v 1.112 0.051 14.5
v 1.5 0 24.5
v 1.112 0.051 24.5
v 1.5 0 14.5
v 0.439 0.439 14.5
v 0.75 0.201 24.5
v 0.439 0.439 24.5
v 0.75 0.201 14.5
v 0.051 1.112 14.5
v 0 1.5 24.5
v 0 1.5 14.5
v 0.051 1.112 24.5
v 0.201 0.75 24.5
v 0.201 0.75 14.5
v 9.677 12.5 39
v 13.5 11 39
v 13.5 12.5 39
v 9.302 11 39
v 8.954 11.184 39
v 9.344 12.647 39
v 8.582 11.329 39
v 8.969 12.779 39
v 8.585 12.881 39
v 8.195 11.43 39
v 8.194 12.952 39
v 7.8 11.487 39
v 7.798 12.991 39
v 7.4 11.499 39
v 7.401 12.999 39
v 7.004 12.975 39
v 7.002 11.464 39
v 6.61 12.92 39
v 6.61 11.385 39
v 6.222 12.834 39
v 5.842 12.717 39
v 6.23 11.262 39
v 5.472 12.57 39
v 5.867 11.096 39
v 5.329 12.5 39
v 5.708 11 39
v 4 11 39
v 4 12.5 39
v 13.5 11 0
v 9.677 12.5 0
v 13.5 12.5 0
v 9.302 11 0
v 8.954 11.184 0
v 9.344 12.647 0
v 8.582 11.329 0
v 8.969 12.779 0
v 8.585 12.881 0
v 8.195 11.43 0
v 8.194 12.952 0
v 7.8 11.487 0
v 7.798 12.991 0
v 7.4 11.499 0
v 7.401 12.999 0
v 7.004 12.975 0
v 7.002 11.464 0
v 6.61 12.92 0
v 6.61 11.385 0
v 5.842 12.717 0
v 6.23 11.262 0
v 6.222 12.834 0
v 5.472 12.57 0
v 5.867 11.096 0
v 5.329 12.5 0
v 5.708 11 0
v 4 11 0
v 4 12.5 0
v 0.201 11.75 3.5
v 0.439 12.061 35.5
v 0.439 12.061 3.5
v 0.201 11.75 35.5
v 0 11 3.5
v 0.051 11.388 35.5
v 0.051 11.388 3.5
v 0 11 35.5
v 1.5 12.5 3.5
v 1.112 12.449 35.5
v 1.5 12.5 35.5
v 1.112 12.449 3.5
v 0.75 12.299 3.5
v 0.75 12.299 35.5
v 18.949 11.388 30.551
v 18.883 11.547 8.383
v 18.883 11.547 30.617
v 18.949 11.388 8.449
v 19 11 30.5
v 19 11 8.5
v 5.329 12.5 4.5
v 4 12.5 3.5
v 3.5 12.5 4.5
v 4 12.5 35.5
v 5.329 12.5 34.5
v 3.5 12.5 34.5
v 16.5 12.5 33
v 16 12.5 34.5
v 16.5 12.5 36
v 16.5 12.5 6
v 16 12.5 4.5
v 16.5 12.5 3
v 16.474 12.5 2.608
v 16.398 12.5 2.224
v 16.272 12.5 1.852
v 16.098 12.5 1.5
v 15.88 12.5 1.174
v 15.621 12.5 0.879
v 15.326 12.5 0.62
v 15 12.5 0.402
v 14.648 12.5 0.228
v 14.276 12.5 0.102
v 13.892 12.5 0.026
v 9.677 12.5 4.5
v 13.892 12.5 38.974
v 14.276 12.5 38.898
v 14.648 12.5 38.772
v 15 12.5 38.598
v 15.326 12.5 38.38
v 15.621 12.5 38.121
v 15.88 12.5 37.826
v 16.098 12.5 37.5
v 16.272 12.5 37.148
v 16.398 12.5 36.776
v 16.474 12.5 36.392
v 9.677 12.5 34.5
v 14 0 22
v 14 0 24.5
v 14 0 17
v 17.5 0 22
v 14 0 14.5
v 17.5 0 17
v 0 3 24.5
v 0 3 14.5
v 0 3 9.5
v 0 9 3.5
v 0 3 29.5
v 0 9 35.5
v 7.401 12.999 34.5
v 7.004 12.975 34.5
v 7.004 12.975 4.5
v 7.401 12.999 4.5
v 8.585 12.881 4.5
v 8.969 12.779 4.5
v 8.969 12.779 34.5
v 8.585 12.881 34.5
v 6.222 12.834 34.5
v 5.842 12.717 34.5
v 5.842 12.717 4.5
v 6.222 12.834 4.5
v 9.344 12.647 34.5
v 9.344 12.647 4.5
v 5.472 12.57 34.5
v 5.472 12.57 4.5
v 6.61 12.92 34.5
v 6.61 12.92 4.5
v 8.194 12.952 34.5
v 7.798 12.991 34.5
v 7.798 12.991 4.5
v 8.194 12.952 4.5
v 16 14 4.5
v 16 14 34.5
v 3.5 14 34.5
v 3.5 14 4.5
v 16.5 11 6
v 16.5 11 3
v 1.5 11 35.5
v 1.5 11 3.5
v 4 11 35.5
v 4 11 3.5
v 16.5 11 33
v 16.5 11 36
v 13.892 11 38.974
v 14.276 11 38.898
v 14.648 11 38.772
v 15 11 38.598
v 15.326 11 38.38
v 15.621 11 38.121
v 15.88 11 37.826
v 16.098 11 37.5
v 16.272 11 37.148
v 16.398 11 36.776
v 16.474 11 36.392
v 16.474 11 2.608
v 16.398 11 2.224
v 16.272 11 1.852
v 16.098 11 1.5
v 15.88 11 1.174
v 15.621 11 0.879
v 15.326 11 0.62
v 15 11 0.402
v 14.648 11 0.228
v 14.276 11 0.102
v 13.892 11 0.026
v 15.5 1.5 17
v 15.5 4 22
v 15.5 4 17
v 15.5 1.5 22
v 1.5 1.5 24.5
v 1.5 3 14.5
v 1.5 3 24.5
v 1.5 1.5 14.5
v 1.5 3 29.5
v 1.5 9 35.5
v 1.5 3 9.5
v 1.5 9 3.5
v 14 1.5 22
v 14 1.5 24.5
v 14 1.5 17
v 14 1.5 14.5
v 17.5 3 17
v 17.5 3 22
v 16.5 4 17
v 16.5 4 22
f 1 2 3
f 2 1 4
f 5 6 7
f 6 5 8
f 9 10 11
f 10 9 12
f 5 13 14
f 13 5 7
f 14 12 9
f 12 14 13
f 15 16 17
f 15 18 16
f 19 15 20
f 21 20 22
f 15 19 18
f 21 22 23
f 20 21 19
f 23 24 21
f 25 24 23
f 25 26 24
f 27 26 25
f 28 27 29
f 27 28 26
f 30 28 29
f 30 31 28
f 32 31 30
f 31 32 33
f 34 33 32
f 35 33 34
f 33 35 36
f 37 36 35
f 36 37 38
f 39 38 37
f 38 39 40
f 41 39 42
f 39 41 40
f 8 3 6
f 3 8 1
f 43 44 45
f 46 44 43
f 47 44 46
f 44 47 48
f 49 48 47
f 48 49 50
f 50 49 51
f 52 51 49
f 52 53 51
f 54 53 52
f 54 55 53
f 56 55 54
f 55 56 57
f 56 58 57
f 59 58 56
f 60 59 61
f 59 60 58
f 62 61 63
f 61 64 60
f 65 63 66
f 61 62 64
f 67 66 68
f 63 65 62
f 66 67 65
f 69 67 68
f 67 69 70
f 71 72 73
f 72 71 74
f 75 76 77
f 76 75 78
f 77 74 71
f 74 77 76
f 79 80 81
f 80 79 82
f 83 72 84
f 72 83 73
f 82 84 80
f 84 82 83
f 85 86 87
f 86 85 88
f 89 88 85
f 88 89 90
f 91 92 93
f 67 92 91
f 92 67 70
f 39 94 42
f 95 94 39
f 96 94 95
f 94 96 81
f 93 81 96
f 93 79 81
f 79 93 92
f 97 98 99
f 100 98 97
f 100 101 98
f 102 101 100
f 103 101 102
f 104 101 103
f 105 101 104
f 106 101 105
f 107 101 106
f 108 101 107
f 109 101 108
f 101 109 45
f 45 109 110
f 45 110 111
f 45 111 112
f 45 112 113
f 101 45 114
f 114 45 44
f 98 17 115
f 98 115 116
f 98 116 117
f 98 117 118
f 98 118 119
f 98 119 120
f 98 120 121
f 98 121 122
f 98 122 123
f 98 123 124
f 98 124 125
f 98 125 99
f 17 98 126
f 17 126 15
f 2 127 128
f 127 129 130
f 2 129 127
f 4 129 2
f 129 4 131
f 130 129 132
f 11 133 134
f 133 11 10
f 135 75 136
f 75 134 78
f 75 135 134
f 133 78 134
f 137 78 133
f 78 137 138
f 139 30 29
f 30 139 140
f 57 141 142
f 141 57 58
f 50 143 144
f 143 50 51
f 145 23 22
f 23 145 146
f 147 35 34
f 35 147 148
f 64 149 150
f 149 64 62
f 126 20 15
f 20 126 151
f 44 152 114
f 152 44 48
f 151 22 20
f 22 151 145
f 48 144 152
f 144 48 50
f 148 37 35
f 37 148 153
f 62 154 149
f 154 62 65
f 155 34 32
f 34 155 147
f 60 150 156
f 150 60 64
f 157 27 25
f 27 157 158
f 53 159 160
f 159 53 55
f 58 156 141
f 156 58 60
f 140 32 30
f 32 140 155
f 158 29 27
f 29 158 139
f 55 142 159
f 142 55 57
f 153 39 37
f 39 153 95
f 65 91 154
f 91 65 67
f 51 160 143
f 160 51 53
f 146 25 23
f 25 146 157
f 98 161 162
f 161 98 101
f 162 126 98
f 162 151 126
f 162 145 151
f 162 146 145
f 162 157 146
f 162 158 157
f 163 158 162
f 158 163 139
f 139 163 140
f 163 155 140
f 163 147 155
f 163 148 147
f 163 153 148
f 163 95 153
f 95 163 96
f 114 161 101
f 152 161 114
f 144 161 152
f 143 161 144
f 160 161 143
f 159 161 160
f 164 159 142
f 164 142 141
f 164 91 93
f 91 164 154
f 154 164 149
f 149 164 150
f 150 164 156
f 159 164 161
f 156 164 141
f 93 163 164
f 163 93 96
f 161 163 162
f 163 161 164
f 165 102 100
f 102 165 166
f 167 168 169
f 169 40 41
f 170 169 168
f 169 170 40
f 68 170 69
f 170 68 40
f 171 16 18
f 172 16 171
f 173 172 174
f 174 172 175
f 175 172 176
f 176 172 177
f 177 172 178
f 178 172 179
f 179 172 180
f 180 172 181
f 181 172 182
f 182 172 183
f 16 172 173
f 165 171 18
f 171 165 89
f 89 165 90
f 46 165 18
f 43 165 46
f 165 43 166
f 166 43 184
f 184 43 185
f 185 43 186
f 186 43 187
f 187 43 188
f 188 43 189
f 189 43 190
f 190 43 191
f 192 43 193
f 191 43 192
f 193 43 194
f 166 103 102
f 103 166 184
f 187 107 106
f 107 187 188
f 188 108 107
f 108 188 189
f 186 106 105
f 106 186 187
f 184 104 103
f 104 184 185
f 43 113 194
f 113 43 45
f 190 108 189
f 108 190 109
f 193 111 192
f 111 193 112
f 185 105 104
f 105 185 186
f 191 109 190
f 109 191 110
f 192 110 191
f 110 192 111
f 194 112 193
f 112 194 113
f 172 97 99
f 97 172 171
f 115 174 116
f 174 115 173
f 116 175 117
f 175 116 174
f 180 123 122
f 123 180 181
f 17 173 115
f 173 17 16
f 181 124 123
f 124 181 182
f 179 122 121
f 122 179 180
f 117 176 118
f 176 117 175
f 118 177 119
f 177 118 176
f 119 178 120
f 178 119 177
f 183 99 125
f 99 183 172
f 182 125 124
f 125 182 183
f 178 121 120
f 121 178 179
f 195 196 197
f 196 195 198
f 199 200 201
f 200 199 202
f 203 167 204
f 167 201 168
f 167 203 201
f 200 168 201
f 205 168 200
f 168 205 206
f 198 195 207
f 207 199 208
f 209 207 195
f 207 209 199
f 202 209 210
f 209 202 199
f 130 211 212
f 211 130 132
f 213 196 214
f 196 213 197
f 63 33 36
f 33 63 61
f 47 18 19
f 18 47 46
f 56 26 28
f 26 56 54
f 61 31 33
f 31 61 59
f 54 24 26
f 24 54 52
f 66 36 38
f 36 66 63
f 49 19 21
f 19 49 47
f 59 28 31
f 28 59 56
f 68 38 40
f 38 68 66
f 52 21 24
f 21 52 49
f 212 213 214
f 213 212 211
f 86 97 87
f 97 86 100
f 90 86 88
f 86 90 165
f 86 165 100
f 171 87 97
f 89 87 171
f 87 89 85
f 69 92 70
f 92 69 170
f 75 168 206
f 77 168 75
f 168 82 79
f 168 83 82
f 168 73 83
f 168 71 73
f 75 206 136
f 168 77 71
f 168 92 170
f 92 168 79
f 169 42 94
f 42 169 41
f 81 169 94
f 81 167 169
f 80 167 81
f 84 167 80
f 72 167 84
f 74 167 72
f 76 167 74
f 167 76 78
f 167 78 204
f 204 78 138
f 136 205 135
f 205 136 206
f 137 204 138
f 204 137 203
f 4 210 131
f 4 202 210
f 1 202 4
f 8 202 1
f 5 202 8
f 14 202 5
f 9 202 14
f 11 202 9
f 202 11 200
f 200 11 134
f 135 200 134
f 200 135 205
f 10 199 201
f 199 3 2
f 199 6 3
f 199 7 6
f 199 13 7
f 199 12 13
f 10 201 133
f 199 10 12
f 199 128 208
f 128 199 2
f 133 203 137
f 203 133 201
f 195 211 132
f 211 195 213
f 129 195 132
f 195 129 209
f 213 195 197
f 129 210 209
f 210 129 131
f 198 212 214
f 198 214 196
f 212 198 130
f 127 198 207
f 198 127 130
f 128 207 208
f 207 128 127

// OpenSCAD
// E60 Rear Window Regulator clasp
// Designed by Sean Clulow
// Version 0.2.0

/*
The profile of the window regulator cable cover/clasp is G shaped.
For descriptive purposes we will call the 3 main sides of the clasp "top", "side" and "bottom", with the a "tongue" protuding inwards from the "bottom".
However in the CAD model the "side" of the regulator is allighed with the yz (x=0) plane and the "bottom" is alligned with the xz (y=0) plane and the the top is in the +ve y dimension (parallel to the xzplane) .
This is to ensure when 3D printed, the (theoretically) weaker z plane is at right angles to any loads or stressors
I have increased the thickness of the clasp to 1.5mm to permit easier printing.
*/


$fa=1;
$fs=0.4;
center=false;

wid=19; // Width of Main Body (x-axis)
dep=12.5; // Depth of Main Body (y-axis)
hig=39; // Height of Main Body (z-axis)
size=[wid,dep,hig];
//zcent is the mirror plane (on z axis)
zcent=hig/2;
radius=1.5;
thickness=1.5;
xplanes=[0,thickness, wid-thickness, wid];
yplanes=[0,thickness, dep-thickness, dep];
// Working anti-clockwise round the profile from the open end.
z0=hig; //height of clasp
z1 = 24; // 2nd (triangular) step on RHS of clasp "top"
z2= 27; // 1st step on RHS of clasp top
z3= 32; // LHS of "top" and first step on "side" i.e. max height of "side"
z4= 20; // 2nd (triangular) step on "side" of clasp
z5=10; // 3rd step on "side" and first step on "bottom" max height of "bottom"
z6=5; // 2nd step on "bottom" and height of "tongue"
zheights=[z0, z1, z2, z3, z4, z5, z6];
zpoints=[for(i = [0 : len(zheights) - 1]) [zcent-zheights[i]/2, zcent+zheights[i]/2]];
echo(xplanes);
echo(yplanes);
echo(zpoints);

// Create main bulk and Hollow out
// the shapes to remove material are deliberately increased by 1mm top and bottop in z dimension to eliminate "artifacts" in rendering

difference()
{
	//Main Body
	union()
	{
		translate([radius,0,0]) color("blue") cube(size - [2*radius,0,0]);
		translate([0,radius,0]) color("green") cube(size - [0,2*radius,0]);
		// Round Corners
		for (x = [radius, size[0]-radius], y = [radius, size[1]-radius]) {
			translate([x,y,0]) color("red") cylinder(r=radius, h=size[2]);
		};
		// Bump for Cable ends
		translate([7.5,8,0]) color("pink") cylinder(h=size[2], r=5);
		// Reinforcement over bump
		translate([3.5,11.5,4.5]) color("yellow") cube([12.5 ,2.5,30]);
	}
	// Hollow out (subtraction) in z direction
	// Gap for main Body
	translate([xplanes[1],yplanes[1],0]) cube([14,yplanes[2]-yplanes[1],hig]);

	// Gap above tongue
	translate([15.5,4,0]) cube([2,7,hig]);

	// Gap outside (in front of or to the left of) tongue
	translate([17.5,0,0]) cube([1.5,11,hig]);

	// Grove for cable ends
	translate([7.5,8,0]) cylinder(h=hig, r=3.5);

	// champher on tongue
	linear_extrude(height = hig) polygon(points=[[17.5, 3], [16.5, 4], [17.5,4]]);

	// champher on "top" open (right hand) side that slides under the lip
	linear_extrude(height = hig) polygon(points=[[16.5, 12.5], [19, 12.5], [19,11.5]]);

	// End of Z subtraction

	// Subtraction to Shape "top" of clasp (above cable ends) on the right hand side

	translate([16.5,yplanes[2],0]) cube([2.5,thickness,zpoints[2][0]]);
	translate([16.5,yplanes[2],zpoints[2][1]]) cube([2.5,thickness,zpoints[2][0]]);

	// triangles
	T1=[[0,0], [0,2.5], [2.5,0]];
	translate([wid,yplanes[2], 6]) rotate([90, 0, 180]) linear_extrude(height = thickness) polygon(T1);
	translate([wid,yplanes[2], 33]) rotate([0,90,90]) linear_extrude(height = thickness) polygon(T1);

	// Round the corners
	difference()
	{
	translate([13.5,yplanes[2],0]) cube([3,thickness,3]);
	translate([13.5,yplanes[2],3]) rotate([90, 0, 180]) cylinder(r=3, h=thickness);
	}
	difference()
	{
	translate([13.5,yplanes[2],36]) cube([3,thickness,3]);
	translate([13.5,yplanes[2],36]) rotate([90, 0, 180]) cylinder(r=3, h=thickness);
	}

	// Subtraction to Shape side of clasp

	// Remove Blocks top and bottom
	translate([0,0,0]) cube([4,dep,zpoints[3][0]]);
	translate([0,0,zpoints[3][1]]) cube([4,dep,zpoints[3][0]]);

	// Remove Triangle
	T2 = [[0,0], [0,7], [7,0]];
	translate([0,2, 3.5]) rotate([90, 0, 90]) linear_extrude(height = thickness) polygon(T2);
	translate([0,2, 35.5]) rotate([0,90,0]) linear_extrude(height = thickness) polygon(T2);

	// Subtraction to Shape underside of clasp
	// Remove blocks top and bottom
	translate([0,0,0]) cube([wid,3,zpoints[5][0]]);
	translate([0,0,zpoints[5][1]]) cube([wid,3,zpoints[5][0]]);

	// Subtraction to Shape tongue of clasp

	translate([14,0,0]) cube([4,5.5,zpoints[6][0]]);
	translate([14,0,zpoints[6][1]]) cube([4,5.5, zpoints[6][0]]);

	//End of subtraction
}
